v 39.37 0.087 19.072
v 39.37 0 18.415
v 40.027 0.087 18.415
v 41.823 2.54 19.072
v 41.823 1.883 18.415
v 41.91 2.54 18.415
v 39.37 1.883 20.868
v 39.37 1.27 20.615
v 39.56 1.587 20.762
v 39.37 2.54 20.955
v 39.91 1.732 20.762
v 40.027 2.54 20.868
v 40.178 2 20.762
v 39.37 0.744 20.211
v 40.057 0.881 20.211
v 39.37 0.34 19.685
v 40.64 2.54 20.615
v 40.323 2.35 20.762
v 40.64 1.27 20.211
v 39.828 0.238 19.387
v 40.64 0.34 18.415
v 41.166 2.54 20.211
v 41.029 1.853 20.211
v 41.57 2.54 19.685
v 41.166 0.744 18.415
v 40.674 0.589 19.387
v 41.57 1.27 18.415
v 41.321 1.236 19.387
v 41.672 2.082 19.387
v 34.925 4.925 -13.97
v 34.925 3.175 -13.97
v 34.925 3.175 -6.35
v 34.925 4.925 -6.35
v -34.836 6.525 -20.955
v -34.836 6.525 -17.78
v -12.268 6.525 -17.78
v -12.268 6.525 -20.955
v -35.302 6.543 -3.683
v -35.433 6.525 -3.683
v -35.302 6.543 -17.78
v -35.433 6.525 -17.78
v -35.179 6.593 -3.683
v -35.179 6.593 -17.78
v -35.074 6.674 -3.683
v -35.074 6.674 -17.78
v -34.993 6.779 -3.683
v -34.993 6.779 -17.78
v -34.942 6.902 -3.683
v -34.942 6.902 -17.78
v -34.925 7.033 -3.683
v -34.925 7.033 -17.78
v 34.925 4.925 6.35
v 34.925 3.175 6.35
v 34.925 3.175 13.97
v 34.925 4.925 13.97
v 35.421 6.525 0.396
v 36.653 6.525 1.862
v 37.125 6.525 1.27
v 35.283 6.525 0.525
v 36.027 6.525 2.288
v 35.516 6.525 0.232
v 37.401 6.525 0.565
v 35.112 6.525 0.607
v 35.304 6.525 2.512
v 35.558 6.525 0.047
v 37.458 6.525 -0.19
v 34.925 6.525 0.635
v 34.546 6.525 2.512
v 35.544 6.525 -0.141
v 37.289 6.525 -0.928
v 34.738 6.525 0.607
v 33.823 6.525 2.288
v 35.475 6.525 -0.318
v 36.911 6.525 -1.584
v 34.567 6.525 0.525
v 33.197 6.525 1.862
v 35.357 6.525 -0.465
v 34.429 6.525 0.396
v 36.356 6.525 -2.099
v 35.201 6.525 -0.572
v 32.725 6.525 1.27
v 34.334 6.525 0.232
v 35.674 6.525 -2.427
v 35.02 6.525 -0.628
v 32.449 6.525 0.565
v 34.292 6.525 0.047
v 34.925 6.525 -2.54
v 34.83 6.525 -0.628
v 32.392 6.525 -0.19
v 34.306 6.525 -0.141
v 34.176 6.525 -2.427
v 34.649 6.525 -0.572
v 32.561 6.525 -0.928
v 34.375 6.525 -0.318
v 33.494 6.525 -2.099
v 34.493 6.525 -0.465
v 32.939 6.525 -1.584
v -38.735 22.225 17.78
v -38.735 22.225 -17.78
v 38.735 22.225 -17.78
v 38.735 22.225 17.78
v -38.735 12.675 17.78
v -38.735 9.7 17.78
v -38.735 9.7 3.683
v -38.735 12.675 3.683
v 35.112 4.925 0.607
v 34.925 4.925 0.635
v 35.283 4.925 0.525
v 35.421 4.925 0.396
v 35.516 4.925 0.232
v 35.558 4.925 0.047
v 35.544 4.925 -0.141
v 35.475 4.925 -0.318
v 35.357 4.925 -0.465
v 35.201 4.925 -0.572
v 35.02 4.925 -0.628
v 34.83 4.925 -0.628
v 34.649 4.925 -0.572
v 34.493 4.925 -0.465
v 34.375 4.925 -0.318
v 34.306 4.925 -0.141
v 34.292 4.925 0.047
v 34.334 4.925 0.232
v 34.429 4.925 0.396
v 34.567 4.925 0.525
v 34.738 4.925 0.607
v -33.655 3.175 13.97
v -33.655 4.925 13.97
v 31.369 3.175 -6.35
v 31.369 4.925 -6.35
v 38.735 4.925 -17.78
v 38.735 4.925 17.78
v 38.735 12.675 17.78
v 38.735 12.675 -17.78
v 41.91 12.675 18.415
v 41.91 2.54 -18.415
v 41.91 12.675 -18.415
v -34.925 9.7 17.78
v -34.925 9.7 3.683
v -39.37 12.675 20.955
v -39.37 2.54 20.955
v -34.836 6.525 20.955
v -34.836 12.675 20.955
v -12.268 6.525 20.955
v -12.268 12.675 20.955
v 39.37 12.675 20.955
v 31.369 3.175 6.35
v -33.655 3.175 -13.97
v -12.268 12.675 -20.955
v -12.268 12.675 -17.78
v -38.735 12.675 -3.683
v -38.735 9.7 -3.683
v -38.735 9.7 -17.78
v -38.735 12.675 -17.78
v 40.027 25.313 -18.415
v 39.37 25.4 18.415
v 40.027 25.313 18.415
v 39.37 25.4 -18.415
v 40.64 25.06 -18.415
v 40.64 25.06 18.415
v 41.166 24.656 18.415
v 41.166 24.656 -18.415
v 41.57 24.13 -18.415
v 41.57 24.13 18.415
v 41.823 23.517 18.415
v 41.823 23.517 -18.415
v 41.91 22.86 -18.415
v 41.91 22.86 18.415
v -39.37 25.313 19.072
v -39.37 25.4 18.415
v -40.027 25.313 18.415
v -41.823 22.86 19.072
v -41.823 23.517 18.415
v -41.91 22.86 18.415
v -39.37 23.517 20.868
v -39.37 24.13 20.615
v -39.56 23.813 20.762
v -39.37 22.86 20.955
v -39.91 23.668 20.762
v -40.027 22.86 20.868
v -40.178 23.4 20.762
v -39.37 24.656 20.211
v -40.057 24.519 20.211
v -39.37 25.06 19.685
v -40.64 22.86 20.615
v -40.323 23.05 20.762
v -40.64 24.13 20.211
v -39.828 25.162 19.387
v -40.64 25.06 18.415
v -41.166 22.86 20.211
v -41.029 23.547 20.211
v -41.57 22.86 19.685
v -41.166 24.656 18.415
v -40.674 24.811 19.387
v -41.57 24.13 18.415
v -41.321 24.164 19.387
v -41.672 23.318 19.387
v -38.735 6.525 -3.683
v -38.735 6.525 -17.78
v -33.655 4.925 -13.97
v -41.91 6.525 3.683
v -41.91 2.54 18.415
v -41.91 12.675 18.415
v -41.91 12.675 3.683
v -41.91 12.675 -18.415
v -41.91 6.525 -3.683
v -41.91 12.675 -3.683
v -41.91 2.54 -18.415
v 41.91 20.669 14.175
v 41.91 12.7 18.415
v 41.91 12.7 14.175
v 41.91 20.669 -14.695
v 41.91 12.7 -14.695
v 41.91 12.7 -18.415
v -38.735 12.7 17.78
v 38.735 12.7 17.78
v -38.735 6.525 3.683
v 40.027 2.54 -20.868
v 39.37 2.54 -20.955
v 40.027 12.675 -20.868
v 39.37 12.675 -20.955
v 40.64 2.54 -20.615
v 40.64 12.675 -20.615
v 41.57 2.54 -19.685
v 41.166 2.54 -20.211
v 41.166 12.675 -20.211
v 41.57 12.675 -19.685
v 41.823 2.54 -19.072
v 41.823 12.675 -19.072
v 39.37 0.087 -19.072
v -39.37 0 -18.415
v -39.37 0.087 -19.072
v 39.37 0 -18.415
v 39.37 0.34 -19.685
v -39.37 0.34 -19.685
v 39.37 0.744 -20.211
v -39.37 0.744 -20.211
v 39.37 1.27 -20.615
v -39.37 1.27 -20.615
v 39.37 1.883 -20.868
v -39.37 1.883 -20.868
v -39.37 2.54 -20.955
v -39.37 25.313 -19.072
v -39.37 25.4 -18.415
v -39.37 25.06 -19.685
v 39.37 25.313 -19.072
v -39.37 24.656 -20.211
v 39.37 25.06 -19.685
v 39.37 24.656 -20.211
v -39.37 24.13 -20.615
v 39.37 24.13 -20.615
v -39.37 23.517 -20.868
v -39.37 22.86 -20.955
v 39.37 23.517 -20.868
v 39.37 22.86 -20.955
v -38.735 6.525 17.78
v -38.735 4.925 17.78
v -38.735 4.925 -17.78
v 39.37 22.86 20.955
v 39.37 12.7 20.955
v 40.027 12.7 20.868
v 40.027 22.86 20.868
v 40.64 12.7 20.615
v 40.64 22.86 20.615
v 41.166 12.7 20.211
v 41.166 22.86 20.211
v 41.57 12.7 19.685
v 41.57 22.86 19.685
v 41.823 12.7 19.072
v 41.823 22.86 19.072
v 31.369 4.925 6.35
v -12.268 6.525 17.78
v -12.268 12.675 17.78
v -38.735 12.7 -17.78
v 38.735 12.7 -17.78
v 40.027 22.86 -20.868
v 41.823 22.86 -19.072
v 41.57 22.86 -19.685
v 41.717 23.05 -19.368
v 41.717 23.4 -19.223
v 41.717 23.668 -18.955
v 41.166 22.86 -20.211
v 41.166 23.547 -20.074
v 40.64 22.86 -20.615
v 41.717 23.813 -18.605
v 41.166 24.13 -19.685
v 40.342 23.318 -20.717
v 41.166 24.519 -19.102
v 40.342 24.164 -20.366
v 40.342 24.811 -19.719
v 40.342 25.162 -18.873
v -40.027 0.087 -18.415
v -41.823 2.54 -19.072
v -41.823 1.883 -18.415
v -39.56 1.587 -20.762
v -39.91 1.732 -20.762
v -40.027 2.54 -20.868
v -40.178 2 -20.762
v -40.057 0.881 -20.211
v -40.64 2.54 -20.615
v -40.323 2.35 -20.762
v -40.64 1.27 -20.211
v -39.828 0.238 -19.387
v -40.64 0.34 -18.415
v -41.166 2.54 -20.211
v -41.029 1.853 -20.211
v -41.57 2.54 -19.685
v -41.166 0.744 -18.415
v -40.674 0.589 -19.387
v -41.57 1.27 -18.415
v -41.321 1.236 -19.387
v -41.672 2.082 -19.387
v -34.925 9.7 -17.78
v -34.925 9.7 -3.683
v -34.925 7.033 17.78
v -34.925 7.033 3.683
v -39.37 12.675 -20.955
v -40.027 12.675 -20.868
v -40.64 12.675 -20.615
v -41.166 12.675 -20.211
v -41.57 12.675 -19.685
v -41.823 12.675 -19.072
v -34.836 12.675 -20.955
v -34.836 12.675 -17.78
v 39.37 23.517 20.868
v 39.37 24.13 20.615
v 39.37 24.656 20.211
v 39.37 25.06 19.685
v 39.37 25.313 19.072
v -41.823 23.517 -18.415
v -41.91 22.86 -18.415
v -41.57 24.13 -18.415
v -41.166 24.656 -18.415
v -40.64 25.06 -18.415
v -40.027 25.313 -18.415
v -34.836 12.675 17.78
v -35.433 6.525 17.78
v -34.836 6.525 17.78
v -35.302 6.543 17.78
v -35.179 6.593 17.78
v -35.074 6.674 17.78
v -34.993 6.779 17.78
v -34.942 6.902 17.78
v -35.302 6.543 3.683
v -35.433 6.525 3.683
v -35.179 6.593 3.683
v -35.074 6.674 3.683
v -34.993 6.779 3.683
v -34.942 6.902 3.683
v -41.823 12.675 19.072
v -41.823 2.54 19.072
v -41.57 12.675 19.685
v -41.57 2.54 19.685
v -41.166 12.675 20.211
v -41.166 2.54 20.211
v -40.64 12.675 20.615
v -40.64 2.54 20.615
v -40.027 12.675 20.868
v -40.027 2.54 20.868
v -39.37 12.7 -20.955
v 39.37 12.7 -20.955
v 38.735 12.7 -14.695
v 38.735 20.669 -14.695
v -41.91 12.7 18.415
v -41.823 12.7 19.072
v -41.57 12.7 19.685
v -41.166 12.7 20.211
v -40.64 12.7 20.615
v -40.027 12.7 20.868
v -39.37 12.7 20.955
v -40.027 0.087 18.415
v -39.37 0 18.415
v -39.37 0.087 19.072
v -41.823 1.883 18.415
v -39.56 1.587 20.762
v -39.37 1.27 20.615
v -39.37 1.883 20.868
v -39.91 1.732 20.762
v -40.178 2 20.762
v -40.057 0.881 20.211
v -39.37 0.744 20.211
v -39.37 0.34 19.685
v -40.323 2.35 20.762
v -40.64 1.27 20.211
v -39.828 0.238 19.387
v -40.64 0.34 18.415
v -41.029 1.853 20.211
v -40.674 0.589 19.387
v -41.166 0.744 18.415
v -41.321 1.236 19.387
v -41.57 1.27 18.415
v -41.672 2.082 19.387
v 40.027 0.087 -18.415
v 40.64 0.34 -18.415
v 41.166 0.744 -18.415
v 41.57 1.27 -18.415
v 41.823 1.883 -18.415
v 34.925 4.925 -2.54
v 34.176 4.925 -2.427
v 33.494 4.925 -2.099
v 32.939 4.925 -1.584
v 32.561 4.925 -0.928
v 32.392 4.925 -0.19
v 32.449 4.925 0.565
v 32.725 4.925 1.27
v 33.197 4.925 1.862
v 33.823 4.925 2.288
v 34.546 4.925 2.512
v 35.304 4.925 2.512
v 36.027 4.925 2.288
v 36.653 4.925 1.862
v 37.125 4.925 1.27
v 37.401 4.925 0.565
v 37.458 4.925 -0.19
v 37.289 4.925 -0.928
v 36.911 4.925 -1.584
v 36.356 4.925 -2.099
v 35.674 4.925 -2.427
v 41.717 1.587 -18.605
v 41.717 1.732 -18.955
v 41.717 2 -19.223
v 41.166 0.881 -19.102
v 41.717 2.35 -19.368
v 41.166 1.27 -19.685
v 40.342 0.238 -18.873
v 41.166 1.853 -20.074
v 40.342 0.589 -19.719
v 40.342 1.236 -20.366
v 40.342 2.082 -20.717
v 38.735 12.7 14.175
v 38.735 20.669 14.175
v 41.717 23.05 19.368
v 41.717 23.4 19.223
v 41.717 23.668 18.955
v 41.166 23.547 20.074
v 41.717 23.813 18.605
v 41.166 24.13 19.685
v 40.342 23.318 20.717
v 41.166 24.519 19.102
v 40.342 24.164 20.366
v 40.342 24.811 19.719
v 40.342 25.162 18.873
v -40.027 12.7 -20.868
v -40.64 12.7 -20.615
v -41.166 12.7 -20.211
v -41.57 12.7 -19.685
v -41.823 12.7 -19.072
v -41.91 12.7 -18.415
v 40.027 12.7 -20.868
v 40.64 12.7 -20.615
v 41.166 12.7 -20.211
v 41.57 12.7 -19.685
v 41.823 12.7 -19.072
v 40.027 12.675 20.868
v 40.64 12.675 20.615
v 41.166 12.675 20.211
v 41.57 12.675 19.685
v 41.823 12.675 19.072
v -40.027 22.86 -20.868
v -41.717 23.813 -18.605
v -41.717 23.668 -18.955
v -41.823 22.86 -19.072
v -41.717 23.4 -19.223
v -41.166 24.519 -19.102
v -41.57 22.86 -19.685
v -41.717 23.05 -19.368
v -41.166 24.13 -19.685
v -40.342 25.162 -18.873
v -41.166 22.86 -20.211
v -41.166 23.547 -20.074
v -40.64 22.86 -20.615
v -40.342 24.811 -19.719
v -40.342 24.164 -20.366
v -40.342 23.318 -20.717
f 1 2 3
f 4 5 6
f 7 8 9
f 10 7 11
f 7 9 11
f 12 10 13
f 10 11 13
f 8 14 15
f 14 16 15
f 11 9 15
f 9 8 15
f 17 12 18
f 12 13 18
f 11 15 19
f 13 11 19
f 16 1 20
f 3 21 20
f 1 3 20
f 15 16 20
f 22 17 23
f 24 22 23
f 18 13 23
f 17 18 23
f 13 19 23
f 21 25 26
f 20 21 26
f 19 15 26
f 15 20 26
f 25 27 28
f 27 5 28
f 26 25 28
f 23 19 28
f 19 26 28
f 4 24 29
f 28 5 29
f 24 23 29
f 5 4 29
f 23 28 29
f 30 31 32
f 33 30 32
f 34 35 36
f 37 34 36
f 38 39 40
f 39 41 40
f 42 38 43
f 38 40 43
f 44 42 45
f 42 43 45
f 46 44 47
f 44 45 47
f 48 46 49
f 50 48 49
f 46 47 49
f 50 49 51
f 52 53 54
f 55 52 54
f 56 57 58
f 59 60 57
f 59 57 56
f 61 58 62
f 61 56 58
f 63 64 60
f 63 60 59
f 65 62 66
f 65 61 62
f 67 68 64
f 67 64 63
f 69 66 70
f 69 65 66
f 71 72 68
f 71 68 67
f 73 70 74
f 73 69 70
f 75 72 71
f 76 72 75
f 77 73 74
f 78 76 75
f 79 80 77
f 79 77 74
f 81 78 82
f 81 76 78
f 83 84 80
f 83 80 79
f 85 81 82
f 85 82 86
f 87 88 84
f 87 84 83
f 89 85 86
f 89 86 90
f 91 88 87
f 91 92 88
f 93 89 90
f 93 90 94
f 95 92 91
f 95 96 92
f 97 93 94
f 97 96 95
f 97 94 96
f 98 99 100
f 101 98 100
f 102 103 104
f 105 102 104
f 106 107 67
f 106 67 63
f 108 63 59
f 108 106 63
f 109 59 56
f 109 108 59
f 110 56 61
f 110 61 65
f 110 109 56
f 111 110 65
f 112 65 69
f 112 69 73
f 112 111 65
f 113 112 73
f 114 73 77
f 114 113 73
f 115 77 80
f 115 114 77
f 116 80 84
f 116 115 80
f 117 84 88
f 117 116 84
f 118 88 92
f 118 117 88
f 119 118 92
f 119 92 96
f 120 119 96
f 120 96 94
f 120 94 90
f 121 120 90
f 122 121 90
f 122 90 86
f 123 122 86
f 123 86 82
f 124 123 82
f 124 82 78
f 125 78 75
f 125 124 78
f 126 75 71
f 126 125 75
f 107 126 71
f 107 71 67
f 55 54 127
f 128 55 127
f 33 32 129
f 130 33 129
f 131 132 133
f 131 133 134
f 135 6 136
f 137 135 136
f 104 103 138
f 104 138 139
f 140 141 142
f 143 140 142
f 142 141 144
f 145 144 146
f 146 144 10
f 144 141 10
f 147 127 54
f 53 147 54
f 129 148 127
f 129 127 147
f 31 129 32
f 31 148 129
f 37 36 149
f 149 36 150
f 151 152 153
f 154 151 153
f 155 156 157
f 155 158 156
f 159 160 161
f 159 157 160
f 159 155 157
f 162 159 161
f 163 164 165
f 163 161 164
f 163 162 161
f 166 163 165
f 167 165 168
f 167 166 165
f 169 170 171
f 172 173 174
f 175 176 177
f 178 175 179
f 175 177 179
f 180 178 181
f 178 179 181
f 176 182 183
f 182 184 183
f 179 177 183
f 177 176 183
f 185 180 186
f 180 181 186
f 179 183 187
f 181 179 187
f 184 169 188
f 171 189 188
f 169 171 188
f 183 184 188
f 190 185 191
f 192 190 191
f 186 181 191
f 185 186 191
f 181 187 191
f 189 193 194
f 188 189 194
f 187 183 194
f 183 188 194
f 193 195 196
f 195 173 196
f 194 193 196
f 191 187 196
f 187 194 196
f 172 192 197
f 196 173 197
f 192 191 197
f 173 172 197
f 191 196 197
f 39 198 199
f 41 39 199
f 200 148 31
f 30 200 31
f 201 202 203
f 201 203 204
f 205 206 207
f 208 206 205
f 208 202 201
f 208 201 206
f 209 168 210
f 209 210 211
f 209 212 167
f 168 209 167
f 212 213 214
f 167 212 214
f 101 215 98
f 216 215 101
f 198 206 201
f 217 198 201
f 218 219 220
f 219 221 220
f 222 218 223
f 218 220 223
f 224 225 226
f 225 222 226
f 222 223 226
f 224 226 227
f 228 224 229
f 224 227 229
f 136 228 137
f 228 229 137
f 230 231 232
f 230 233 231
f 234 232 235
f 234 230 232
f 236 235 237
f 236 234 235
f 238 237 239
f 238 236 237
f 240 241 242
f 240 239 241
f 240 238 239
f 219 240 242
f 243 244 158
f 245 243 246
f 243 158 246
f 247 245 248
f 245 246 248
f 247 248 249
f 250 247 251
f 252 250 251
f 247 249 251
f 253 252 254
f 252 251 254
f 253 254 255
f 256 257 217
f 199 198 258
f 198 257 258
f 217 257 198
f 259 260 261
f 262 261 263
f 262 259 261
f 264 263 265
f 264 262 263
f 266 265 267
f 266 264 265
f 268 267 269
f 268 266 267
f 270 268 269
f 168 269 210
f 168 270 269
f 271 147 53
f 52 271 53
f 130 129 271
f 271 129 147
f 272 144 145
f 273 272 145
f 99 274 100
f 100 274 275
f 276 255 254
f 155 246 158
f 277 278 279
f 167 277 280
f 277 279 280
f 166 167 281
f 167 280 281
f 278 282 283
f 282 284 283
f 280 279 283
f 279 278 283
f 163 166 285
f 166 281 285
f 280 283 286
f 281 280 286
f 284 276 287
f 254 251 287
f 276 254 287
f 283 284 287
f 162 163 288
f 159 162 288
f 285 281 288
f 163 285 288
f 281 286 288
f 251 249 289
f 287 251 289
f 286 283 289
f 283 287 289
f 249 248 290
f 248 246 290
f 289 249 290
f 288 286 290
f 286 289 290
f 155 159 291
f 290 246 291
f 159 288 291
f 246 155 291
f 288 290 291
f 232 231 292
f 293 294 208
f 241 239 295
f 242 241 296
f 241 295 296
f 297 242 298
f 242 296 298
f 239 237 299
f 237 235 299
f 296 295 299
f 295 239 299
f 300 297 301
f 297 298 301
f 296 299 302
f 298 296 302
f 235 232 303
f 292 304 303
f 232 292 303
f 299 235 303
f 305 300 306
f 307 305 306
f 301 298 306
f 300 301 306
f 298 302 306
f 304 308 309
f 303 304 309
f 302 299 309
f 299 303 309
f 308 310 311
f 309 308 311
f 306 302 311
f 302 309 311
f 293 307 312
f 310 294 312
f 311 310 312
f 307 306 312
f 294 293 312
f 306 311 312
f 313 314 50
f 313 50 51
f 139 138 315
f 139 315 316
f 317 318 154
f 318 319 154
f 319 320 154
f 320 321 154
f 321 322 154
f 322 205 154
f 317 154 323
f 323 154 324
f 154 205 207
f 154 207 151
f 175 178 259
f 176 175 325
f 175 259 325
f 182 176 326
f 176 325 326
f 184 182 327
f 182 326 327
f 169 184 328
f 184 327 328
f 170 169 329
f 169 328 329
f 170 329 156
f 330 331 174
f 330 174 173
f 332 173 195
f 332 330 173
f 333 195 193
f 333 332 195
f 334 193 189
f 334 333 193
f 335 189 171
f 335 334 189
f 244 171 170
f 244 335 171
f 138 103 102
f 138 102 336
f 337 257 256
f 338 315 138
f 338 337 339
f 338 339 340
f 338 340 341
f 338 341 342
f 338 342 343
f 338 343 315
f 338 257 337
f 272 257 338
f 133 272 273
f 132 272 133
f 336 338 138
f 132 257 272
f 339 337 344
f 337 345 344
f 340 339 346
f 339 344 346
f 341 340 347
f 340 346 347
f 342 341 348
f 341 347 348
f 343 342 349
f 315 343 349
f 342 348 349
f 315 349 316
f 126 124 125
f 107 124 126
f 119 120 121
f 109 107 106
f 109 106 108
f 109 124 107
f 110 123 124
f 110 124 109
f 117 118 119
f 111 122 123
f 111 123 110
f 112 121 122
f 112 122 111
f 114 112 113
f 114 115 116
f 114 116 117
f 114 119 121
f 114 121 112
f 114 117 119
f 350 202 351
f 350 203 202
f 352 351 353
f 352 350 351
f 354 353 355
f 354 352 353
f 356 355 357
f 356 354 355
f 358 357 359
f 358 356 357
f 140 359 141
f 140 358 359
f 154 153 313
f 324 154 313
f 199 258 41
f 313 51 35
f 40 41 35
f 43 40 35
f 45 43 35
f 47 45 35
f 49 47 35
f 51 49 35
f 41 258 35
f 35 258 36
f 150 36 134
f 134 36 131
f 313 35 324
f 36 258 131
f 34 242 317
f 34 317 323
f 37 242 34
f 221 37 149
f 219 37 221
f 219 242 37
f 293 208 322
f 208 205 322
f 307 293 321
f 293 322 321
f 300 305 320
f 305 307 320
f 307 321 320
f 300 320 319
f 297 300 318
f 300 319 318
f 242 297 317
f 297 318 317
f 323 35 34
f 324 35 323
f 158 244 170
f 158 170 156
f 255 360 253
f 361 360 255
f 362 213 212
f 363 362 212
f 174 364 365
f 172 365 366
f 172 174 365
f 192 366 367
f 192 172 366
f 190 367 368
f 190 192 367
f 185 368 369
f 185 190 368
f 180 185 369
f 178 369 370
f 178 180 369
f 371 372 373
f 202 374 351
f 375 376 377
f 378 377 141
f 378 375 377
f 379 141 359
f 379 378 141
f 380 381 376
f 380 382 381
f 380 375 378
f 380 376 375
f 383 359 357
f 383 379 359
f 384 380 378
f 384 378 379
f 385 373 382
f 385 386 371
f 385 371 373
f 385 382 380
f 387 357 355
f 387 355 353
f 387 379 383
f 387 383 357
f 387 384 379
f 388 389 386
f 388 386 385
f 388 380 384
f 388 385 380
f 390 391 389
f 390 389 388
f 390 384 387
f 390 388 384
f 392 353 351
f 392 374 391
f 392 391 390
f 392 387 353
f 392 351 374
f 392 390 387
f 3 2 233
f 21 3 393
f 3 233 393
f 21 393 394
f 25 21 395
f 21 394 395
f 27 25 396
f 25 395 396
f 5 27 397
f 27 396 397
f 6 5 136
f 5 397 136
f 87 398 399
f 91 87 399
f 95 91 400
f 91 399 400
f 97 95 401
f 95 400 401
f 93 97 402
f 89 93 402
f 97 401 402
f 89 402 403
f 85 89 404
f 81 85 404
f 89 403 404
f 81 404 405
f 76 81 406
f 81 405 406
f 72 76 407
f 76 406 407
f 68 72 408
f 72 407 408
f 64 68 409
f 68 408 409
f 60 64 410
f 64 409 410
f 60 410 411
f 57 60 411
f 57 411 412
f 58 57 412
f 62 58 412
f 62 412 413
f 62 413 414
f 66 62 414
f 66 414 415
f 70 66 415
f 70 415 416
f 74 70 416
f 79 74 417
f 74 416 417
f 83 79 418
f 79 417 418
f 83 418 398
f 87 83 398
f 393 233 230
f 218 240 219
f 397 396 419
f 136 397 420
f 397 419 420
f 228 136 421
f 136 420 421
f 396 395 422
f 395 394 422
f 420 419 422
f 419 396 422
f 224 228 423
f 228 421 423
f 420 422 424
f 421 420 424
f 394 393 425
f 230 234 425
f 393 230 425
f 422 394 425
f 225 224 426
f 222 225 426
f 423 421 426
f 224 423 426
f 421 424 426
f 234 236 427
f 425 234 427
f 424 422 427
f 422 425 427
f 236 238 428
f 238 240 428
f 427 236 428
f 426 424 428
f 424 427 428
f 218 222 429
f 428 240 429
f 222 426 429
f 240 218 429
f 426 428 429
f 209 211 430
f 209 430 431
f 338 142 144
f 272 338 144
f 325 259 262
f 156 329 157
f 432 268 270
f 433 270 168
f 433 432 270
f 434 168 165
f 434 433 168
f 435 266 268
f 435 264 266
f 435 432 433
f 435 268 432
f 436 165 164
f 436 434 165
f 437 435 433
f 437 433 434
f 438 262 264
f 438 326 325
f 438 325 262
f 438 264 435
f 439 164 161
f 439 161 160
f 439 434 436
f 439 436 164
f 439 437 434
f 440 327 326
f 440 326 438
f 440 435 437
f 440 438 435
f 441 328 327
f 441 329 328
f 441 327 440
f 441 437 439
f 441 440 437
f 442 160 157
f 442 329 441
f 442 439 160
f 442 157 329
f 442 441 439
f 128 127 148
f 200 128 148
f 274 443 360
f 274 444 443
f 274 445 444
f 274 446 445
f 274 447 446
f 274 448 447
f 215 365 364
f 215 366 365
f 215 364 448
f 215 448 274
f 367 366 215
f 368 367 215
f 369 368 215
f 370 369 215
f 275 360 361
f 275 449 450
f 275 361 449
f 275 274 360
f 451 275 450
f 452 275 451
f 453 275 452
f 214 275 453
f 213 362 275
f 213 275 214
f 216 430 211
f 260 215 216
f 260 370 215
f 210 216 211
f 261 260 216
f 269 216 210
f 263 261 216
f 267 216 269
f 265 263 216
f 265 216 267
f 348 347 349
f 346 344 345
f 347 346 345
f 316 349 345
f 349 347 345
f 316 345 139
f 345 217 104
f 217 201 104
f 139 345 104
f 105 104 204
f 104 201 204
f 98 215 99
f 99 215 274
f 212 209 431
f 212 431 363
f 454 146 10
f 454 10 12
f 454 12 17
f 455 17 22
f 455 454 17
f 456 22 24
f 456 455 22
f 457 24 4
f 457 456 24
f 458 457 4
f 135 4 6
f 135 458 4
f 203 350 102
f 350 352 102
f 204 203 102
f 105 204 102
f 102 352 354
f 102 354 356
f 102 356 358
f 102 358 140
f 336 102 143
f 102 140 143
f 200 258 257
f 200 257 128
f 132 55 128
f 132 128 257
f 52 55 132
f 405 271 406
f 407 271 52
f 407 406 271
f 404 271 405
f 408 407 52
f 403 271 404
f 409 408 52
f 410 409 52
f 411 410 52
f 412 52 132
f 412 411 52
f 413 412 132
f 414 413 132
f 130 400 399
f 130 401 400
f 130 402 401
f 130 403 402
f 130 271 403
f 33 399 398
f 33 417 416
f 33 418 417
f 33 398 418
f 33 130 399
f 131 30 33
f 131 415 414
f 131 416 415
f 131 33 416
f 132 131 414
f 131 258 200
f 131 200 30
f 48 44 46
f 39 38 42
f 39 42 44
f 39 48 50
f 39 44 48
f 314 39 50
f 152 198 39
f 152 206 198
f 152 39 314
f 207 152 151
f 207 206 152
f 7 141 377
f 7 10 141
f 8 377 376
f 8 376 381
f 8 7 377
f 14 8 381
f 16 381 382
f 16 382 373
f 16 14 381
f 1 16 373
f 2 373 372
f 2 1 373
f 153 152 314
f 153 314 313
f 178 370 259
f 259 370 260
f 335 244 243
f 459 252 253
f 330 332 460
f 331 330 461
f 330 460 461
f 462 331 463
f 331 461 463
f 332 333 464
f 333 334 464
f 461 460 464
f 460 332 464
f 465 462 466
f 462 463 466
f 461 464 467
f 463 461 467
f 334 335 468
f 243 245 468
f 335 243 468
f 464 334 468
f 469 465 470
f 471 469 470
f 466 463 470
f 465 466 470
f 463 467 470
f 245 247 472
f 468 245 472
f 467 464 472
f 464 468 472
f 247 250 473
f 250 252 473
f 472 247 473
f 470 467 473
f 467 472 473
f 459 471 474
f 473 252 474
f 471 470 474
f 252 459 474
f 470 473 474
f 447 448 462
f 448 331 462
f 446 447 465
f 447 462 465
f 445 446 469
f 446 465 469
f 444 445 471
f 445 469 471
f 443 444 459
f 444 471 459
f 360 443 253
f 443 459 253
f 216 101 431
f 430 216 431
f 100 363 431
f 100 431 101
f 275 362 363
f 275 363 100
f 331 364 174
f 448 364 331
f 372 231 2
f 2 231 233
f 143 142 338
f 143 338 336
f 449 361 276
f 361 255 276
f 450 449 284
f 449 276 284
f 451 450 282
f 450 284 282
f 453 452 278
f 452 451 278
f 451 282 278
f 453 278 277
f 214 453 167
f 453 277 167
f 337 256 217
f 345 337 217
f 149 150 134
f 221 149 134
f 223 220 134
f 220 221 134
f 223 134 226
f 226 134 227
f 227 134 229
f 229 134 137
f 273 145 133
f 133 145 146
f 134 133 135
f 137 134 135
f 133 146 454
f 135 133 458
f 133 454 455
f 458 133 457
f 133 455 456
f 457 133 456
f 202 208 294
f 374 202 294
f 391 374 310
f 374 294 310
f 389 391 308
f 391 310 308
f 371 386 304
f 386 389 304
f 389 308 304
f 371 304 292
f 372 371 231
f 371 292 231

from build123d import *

# Parameters (mm, degrees)
SKETCH1_W           = 83.82
SKETCH1_H           = 41.91
BOSS_EXTRUDE1_DEPTH = 25.4
SKETCH2_W           = 22.5679
SKETCH2_H           = 6.14934
CUT_EXTRUDE1_DEPTH  = 65.482991556
SHELL1_T            = -3.175
CUT_EXTRUDE3_REACH  = 92.056
SKETCH4_W           = 7.366
SKETCH4_H           = 6.14934
FILLET1_R           = 2.54
SKETCH5_W           = 89.038189856
SKETCH5_H           = 0.0254
CUT_EXTRUDE4_DEPTH  = 65.482991556
SKETCH6_W           = 77.47
SKETCH6_H           = 35.56
BOSS_EXTRUDE2_DEPTH = 1.75006
SKETCH7_R           = 2.54
SKETCH7_R_2         = 0.635
BOSS_EXTRUDE3_DEPTH = 1.6002
SKETCH8_W           = 14.097
SKETCH8_H           = 3.175
BOSS_EXTRUDE4_DEPTH = 3.81
FILLET2_R           = 0.508
SKETCH9_W           = 28.870221249
SKETCH9_H           = 7.968851024
CUT_EXTRUDE5_DEPTH  = 3.175


with BuildPart() as part:
    # Sketch1 → Boss-Extrude1 (new body)
    with BuildSketch(Plane(origin=(0, 0, 0), x_dir=(1, 0, 0), z_dir=(0, 1, 0))):
        Rectangle(SKETCH1_W, SKETCH1_H)
    extrude(amount=BOSS_EXTRUDE1_DEPTH)

    # Sketch2 → Cut-Extrude1 (cut, through all)
    with BuildSketch(Plane.XY.offset(20.955)):
        with Locations((-23.55215, 9.59993)):
            Rectangle(SKETCH2_W, SKETCH2_H)
    extrude(amount=-CUT_EXTRUDE1_DEPTH, mode=Mode.SUBTRACT)

    # Shell1
    shell1_openings = [part.faces().sort_by_distance(p)[0] for p in [
        (-34.8361, 9.59993, 0),
        (-23.55215, 12.6746, 0),
        (-12.2682, 9.59993, 0),
        (-23.55215, 6.52526, 0),
    ]]
    offset(amount=SHELL1_T, openings=shell1_openings, kind=Kind.INTERSECTION)

    # Sketch4 → Cut-Extrude3 (cut, up to next)
    with BuildSketch(Plane.ZY.offset(41.91), mode=Mode.PRIVATE) as cut_extrude3_sk1:
        with Locations((0, 9.59993)):
            Rectangle(SKETCH4_W, SKETCH4_H)
    cut_extrude3_tool1 = extrude(cut_extrude3_sk1.sketch, amount=-CUT_EXTRUDE3_REACH, mode=Mode.PRIVATE) & part.part
    add(cut_extrude3_tool1.solids().sort_by_distance((-41.91, 9.59993, 0))[0], mode=Mode.SUBTRACT)

    # Fillet1
    fillet1_edges = [part.edges().sort_by_distance(p)[0] for p in [
        (0, 25.4, -20.955),
        (-41.91, 25.4, 0),
        (0, 25.4, 20.955),
        (-41.91, 0, 0),
        (0, 0, -20.955),
        (41.91, 0, 0),
        (0, 0, 20.955),
        (-41.91, 12.7, 20.955),
        (-41.91, 12.7, -20.955),
        (41.91, 12.7, -20.955),
        (41.91, 12.7, 20.955),
        (41.91, 25.4, 0),
    ]]
    fillet(fillet1_edges, radius=FILLET1_R)

    # Sketch5 → Cut-Extrude4 (cut, through all)
    with BuildSketch(Plane.XY.offset(20.955)):
        with Locations((0.216743403, 12.6873)):
            Rectangle(SKETCH5_W, SKETCH5_H)
    extrude(amount=-CUT_EXTRUDE4_DEPTH, mode=Mode.SUBTRACT)


with BuildPart() as cut_extrude4_piece_1:
    # of the separate pieces the step leaves, piece 1, a body of its own (cut_extrude4_pieces)
    add(part.part.solids().sort_by_distance((-39.37, 12.7, 20.955))[0])

    # Sketch9 → Cut-Extrude5 (cut)
    with BuildSketch(Plane(origin=(41.91, 0, 0), x_dir=(0, 0, -1), z_dir=(1, 0, 0))):
        with Locations((0.260092084, 16.684425512)):
            Rectangle(SKETCH9_W, SKETCH9_H)
    extrude(amount=-CUT_EXTRUDE5_DEPTH, mode=Mode.SUBTRACT)


with BuildPart() as cut_extrude4_piece_2:
    # of the separate pieces the step leaves, piece 2, a body of its own (cut_extrude4_pieces)
    add(part.part.solids().sort_by_distance((-39.37, 2.54, 20.955))[0])

    # Sketch6 → Boss-Extrude2 (add)
    with BuildSketch(Plane(origin=(0, 3.175, 0), x_dir=(1, 0, 0), z_dir=(0, 1, 0))):
        Rectangle(SKETCH6_W, SKETCH6_H)
        Polygon((-33.655, -13.97), (-33.655, 13.97), (34.925, 13.97), (34.925, 6.35), (31.369, 6.35), (31.369, -6.35), (34.925, -6.35), (34.925, -13.97), align=None, mode=Mode.SUBTRACT)
    extrude(amount=BOSS_EXTRUDE2_DEPTH)

    # Sketch7 → Boss-Extrude3 (add)
    with BuildSketch(Plane(origin=(0, 4.92506, 0), x_dir=(1, 0, 0), z_dir=(0, 1, 0))):
        with Locations(Location((34.925, 0, 0), (0, 0, 90))):
            Circle(SKETCH7_R)
        with Locations(Location((34.925, 0, 0), (0, 0, 270))):
            Circle(SKETCH7_R_2, mode=Mode.SUBTRACT)
    extrude(amount=BOSS_EXTRUDE3_DEPTH)

    # Sketch8 → Boss-Extrude4 (add)
    with BuildSketch(Plane(origin=(-38.735, 0, 0), x_dir=(0, 0, -1), z_dir=(1, 0, 0))):
        with Locations((-10.7315, 8.11276)):
            Rectangle(SKETCH8_W, SKETCH8_H)
        with Locations((10.7315, 8.11276)):
            Rectangle(SKETCH8_W, SKETCH8_H)
    extrude(amount=BOSS_EXTRUDE4_DEPTH)

    # Fillet2
    fillet2_edges = [cut_extrude4_piece_2.edges().sort_by_distance(p)[0] for p in [
        (-34.925, 6.52526, 10.7315),
        (-34.925, 6.52526, -10.7315),
    ]]
    fillet(fillet2_edges, radius=FILLET2_R)


solid = Compound([cut_extrude4_piece_1.part, cut_extrude4_piece_2.part])
